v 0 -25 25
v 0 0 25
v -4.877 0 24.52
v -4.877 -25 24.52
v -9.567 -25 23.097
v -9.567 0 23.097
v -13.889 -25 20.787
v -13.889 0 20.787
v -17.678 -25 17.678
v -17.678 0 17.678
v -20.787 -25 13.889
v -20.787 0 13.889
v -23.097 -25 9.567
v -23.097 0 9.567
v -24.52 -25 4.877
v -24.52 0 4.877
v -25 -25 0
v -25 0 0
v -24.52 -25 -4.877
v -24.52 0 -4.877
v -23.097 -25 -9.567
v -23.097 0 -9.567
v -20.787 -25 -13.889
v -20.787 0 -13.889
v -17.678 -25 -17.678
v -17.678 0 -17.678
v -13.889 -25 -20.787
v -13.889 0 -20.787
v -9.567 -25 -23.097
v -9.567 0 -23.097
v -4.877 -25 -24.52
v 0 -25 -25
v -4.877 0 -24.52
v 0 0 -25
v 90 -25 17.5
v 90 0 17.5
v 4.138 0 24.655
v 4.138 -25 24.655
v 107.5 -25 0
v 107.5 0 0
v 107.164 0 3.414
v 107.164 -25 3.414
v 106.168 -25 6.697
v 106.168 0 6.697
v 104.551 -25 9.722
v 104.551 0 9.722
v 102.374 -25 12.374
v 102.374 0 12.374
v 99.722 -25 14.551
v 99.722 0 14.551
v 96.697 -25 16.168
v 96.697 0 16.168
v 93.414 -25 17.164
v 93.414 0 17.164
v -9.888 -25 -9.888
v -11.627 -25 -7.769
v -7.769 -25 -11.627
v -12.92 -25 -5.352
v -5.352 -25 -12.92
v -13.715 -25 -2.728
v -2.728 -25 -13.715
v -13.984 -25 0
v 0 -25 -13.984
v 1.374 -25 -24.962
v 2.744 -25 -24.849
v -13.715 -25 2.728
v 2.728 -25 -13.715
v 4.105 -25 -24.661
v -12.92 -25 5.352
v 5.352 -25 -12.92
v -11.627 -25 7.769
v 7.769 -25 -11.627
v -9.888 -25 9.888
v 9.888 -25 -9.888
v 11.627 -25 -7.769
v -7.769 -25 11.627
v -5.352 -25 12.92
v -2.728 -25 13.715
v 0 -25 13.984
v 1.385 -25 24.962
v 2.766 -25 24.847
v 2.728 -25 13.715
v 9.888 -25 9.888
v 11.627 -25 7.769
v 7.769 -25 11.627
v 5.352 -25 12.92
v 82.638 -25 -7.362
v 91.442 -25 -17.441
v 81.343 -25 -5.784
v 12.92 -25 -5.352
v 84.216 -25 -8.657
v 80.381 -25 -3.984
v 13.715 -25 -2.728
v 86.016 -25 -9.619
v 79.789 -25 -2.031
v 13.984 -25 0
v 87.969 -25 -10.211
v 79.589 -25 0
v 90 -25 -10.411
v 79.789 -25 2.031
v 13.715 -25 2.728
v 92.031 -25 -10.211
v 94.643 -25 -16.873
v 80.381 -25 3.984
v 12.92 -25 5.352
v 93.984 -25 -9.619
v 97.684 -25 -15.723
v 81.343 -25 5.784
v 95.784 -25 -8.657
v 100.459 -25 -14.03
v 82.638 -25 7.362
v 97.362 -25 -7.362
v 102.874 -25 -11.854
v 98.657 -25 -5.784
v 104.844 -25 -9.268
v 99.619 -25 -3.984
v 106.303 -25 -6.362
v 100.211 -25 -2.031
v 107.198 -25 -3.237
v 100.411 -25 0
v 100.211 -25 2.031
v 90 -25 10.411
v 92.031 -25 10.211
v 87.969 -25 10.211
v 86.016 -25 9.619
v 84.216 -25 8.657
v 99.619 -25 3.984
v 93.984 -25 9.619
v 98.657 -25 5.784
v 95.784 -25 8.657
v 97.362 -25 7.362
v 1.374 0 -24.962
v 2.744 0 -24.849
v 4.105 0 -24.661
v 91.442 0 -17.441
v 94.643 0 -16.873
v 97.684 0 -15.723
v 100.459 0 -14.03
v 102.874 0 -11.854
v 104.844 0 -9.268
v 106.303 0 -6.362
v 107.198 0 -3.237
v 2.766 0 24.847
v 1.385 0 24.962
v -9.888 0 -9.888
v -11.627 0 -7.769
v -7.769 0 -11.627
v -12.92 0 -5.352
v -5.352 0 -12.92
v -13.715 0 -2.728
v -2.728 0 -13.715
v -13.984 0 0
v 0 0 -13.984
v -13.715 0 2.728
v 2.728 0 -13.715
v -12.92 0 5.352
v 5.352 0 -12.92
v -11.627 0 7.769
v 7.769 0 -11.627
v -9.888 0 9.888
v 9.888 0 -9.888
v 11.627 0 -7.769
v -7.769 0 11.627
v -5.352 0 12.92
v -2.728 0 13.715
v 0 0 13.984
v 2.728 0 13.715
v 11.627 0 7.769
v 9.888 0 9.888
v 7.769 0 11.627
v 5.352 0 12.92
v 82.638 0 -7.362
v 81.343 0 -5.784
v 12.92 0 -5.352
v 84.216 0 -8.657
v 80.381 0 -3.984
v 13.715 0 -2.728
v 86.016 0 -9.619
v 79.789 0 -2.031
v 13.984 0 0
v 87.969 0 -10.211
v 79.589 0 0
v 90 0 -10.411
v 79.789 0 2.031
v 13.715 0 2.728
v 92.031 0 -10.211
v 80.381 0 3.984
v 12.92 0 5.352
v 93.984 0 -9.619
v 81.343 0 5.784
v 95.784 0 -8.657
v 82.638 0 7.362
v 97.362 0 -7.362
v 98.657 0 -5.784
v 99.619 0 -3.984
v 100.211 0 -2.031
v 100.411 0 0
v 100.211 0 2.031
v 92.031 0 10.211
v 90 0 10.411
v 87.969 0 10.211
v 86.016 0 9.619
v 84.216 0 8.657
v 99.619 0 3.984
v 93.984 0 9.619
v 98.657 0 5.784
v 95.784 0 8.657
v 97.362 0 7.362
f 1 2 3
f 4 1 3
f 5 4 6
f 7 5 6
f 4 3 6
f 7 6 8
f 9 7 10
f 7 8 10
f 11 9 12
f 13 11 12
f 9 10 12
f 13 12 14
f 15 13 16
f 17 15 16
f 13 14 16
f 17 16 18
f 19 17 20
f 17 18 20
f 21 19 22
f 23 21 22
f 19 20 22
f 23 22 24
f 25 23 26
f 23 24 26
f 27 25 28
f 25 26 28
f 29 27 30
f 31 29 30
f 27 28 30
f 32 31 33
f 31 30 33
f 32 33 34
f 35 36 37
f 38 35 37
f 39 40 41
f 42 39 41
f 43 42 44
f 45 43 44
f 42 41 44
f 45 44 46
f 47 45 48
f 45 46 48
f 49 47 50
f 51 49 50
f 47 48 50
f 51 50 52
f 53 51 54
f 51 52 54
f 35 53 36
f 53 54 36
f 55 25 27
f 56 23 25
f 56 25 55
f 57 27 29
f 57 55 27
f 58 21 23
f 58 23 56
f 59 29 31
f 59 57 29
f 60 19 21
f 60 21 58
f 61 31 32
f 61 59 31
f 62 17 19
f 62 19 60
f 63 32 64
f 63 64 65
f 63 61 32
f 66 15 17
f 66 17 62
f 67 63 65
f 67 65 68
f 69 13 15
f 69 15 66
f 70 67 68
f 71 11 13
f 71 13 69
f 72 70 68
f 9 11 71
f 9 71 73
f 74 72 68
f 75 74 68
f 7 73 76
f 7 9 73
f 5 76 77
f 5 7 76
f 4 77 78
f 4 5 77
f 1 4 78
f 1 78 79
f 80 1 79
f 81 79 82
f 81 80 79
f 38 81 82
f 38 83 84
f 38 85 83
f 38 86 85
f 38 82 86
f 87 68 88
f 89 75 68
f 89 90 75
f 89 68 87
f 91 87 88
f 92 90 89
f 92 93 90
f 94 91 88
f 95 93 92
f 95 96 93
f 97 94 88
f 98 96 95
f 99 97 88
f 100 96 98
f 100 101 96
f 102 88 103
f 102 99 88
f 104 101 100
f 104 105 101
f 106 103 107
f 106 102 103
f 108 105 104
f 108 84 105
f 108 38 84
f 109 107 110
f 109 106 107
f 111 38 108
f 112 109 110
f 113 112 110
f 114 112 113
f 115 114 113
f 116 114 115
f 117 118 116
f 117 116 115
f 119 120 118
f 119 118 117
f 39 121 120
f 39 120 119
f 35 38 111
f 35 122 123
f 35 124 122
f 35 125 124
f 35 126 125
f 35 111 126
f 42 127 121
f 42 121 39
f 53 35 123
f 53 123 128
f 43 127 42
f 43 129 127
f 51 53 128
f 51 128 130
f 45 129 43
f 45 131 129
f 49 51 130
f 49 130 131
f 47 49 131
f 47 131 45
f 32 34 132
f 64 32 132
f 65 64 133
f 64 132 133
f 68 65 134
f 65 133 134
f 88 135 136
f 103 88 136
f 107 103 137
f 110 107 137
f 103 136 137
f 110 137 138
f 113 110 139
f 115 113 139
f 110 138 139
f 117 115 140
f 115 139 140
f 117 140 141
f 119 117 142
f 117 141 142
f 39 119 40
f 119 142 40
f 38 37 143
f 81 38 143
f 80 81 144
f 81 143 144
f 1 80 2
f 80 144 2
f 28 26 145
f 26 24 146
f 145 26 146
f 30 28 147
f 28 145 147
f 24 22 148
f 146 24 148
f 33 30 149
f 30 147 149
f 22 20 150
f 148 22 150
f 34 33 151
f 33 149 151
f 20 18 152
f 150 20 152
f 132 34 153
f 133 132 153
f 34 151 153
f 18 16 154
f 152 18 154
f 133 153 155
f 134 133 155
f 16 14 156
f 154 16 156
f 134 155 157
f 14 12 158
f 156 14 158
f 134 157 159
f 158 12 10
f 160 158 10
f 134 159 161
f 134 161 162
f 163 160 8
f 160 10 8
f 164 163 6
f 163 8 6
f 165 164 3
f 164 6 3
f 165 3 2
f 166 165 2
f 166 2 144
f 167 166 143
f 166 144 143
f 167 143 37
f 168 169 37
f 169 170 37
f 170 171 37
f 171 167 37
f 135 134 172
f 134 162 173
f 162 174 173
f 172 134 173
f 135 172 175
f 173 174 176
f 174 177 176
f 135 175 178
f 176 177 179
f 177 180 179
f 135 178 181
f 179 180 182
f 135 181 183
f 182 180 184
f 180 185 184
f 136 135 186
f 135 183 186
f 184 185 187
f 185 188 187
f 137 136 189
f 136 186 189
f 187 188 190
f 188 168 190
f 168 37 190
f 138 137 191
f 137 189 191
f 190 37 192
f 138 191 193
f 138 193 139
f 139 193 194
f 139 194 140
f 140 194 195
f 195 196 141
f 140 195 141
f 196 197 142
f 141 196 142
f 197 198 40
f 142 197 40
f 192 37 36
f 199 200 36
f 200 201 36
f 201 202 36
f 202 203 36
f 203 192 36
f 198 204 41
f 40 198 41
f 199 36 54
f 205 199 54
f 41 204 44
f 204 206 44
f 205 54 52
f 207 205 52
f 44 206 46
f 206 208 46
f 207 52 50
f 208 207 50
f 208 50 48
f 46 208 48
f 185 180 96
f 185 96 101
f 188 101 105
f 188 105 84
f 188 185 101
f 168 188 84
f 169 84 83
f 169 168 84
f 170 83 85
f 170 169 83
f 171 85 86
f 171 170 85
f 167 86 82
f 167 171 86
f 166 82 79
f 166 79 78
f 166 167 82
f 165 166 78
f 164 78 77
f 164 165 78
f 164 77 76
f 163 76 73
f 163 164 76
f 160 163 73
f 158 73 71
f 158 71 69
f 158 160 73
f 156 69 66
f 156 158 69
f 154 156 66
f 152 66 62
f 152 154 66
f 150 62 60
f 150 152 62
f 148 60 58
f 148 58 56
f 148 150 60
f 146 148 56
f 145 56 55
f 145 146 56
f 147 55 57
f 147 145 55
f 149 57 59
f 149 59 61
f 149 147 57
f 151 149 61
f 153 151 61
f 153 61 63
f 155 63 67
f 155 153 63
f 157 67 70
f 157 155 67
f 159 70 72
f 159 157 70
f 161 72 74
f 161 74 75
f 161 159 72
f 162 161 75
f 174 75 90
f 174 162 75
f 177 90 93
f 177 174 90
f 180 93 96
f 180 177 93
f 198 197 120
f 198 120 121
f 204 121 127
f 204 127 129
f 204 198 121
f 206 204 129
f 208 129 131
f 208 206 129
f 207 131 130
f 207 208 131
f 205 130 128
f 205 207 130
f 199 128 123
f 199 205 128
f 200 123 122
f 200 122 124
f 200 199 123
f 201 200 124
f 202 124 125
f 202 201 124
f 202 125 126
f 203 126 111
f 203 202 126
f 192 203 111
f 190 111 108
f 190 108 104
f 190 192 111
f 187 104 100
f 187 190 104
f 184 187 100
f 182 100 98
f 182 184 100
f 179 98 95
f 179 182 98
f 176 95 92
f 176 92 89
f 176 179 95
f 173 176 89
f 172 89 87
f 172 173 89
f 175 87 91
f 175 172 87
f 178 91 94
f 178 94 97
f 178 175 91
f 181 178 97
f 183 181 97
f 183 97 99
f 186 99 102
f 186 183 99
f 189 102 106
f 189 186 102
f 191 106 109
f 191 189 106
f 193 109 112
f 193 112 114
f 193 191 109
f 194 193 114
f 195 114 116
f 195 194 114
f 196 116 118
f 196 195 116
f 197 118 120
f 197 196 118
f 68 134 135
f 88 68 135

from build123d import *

# Parameters (mm, degrees)
F0_R     = 24.106038
F0_R_2   = 10.411348
F0_R_3   = 13.98419
F1_DEPTH = 25


with BuildPart() as f1:
    # F0 (on Front) → F1 (new body)
    with BuildSketch(Plane.XZ):
        with BuildLine():
            Line((4.137931, 24.655172), (0, 25))
            ThreePointArc((0, 25), (-25, 0), (0, -25))
            Line((0, -25), (4.105443, -24.660603))
            ThreePointArc((4.105443, -24.660603), (19.074015, -16.161125), (25, 0))
            ThreePointArc((25, 0), (19.084657, 16.148556), (4.137931, 24.655172))
        make_face()
        Circle(F0_R, mode=Mode.SUBTRACT)
        with BuildLine():
            ThreePointArc((4.137931, 24.655172), (2.076137, 24.913644), (0, 25))
            Line((0, 25), (4.137931, 24.655172))
        make_face()
        with BuildLine():
            Line((4.105443, -24.660603), (0, -25))
            ThreePointArc((0, -25), (2.059724, -24.915006), (4.105443, -24.660603))
        make_face()
        with BuildLine():
            Line((90, 17.5), (4.137931, 24.655172))
            ThreePointArc((4.137931, 24.655172), (19.084657, 16.148556), (25, 0))
            ThreePointArc((25, 0), (19.074015, -16.161125), (4.105443, -24.660603))
            Line((4.105443, -24.660603), (91.441807, -17.440504))
            ThreePointArc((91.441807, -17.440504), (72.51488, -0.721517), (90, 17.5))
        make_face()
        with BuildLine():
            ThreePointArc((107.5, 0), (102.374369, 12.374369), (90, 17.5))
            ThreePointArc((90, 17.5), (72.51488, -0.721517), (91.441807, -17.440504))
            ThreePointArc((91.441807, -17.440504), (102.874036, -11.853657), (107.5, 0))
        make_face()
        with Locations((90, 0)):
            Circle(F0_R_2, mode=Mode.SUBTRACT)
        Circle(F0_R)
        Circle(F0_R_3, mode=Mode.SUBTRACT)
    extrude(amount=F1_DEPTH)


solid = f1.part
